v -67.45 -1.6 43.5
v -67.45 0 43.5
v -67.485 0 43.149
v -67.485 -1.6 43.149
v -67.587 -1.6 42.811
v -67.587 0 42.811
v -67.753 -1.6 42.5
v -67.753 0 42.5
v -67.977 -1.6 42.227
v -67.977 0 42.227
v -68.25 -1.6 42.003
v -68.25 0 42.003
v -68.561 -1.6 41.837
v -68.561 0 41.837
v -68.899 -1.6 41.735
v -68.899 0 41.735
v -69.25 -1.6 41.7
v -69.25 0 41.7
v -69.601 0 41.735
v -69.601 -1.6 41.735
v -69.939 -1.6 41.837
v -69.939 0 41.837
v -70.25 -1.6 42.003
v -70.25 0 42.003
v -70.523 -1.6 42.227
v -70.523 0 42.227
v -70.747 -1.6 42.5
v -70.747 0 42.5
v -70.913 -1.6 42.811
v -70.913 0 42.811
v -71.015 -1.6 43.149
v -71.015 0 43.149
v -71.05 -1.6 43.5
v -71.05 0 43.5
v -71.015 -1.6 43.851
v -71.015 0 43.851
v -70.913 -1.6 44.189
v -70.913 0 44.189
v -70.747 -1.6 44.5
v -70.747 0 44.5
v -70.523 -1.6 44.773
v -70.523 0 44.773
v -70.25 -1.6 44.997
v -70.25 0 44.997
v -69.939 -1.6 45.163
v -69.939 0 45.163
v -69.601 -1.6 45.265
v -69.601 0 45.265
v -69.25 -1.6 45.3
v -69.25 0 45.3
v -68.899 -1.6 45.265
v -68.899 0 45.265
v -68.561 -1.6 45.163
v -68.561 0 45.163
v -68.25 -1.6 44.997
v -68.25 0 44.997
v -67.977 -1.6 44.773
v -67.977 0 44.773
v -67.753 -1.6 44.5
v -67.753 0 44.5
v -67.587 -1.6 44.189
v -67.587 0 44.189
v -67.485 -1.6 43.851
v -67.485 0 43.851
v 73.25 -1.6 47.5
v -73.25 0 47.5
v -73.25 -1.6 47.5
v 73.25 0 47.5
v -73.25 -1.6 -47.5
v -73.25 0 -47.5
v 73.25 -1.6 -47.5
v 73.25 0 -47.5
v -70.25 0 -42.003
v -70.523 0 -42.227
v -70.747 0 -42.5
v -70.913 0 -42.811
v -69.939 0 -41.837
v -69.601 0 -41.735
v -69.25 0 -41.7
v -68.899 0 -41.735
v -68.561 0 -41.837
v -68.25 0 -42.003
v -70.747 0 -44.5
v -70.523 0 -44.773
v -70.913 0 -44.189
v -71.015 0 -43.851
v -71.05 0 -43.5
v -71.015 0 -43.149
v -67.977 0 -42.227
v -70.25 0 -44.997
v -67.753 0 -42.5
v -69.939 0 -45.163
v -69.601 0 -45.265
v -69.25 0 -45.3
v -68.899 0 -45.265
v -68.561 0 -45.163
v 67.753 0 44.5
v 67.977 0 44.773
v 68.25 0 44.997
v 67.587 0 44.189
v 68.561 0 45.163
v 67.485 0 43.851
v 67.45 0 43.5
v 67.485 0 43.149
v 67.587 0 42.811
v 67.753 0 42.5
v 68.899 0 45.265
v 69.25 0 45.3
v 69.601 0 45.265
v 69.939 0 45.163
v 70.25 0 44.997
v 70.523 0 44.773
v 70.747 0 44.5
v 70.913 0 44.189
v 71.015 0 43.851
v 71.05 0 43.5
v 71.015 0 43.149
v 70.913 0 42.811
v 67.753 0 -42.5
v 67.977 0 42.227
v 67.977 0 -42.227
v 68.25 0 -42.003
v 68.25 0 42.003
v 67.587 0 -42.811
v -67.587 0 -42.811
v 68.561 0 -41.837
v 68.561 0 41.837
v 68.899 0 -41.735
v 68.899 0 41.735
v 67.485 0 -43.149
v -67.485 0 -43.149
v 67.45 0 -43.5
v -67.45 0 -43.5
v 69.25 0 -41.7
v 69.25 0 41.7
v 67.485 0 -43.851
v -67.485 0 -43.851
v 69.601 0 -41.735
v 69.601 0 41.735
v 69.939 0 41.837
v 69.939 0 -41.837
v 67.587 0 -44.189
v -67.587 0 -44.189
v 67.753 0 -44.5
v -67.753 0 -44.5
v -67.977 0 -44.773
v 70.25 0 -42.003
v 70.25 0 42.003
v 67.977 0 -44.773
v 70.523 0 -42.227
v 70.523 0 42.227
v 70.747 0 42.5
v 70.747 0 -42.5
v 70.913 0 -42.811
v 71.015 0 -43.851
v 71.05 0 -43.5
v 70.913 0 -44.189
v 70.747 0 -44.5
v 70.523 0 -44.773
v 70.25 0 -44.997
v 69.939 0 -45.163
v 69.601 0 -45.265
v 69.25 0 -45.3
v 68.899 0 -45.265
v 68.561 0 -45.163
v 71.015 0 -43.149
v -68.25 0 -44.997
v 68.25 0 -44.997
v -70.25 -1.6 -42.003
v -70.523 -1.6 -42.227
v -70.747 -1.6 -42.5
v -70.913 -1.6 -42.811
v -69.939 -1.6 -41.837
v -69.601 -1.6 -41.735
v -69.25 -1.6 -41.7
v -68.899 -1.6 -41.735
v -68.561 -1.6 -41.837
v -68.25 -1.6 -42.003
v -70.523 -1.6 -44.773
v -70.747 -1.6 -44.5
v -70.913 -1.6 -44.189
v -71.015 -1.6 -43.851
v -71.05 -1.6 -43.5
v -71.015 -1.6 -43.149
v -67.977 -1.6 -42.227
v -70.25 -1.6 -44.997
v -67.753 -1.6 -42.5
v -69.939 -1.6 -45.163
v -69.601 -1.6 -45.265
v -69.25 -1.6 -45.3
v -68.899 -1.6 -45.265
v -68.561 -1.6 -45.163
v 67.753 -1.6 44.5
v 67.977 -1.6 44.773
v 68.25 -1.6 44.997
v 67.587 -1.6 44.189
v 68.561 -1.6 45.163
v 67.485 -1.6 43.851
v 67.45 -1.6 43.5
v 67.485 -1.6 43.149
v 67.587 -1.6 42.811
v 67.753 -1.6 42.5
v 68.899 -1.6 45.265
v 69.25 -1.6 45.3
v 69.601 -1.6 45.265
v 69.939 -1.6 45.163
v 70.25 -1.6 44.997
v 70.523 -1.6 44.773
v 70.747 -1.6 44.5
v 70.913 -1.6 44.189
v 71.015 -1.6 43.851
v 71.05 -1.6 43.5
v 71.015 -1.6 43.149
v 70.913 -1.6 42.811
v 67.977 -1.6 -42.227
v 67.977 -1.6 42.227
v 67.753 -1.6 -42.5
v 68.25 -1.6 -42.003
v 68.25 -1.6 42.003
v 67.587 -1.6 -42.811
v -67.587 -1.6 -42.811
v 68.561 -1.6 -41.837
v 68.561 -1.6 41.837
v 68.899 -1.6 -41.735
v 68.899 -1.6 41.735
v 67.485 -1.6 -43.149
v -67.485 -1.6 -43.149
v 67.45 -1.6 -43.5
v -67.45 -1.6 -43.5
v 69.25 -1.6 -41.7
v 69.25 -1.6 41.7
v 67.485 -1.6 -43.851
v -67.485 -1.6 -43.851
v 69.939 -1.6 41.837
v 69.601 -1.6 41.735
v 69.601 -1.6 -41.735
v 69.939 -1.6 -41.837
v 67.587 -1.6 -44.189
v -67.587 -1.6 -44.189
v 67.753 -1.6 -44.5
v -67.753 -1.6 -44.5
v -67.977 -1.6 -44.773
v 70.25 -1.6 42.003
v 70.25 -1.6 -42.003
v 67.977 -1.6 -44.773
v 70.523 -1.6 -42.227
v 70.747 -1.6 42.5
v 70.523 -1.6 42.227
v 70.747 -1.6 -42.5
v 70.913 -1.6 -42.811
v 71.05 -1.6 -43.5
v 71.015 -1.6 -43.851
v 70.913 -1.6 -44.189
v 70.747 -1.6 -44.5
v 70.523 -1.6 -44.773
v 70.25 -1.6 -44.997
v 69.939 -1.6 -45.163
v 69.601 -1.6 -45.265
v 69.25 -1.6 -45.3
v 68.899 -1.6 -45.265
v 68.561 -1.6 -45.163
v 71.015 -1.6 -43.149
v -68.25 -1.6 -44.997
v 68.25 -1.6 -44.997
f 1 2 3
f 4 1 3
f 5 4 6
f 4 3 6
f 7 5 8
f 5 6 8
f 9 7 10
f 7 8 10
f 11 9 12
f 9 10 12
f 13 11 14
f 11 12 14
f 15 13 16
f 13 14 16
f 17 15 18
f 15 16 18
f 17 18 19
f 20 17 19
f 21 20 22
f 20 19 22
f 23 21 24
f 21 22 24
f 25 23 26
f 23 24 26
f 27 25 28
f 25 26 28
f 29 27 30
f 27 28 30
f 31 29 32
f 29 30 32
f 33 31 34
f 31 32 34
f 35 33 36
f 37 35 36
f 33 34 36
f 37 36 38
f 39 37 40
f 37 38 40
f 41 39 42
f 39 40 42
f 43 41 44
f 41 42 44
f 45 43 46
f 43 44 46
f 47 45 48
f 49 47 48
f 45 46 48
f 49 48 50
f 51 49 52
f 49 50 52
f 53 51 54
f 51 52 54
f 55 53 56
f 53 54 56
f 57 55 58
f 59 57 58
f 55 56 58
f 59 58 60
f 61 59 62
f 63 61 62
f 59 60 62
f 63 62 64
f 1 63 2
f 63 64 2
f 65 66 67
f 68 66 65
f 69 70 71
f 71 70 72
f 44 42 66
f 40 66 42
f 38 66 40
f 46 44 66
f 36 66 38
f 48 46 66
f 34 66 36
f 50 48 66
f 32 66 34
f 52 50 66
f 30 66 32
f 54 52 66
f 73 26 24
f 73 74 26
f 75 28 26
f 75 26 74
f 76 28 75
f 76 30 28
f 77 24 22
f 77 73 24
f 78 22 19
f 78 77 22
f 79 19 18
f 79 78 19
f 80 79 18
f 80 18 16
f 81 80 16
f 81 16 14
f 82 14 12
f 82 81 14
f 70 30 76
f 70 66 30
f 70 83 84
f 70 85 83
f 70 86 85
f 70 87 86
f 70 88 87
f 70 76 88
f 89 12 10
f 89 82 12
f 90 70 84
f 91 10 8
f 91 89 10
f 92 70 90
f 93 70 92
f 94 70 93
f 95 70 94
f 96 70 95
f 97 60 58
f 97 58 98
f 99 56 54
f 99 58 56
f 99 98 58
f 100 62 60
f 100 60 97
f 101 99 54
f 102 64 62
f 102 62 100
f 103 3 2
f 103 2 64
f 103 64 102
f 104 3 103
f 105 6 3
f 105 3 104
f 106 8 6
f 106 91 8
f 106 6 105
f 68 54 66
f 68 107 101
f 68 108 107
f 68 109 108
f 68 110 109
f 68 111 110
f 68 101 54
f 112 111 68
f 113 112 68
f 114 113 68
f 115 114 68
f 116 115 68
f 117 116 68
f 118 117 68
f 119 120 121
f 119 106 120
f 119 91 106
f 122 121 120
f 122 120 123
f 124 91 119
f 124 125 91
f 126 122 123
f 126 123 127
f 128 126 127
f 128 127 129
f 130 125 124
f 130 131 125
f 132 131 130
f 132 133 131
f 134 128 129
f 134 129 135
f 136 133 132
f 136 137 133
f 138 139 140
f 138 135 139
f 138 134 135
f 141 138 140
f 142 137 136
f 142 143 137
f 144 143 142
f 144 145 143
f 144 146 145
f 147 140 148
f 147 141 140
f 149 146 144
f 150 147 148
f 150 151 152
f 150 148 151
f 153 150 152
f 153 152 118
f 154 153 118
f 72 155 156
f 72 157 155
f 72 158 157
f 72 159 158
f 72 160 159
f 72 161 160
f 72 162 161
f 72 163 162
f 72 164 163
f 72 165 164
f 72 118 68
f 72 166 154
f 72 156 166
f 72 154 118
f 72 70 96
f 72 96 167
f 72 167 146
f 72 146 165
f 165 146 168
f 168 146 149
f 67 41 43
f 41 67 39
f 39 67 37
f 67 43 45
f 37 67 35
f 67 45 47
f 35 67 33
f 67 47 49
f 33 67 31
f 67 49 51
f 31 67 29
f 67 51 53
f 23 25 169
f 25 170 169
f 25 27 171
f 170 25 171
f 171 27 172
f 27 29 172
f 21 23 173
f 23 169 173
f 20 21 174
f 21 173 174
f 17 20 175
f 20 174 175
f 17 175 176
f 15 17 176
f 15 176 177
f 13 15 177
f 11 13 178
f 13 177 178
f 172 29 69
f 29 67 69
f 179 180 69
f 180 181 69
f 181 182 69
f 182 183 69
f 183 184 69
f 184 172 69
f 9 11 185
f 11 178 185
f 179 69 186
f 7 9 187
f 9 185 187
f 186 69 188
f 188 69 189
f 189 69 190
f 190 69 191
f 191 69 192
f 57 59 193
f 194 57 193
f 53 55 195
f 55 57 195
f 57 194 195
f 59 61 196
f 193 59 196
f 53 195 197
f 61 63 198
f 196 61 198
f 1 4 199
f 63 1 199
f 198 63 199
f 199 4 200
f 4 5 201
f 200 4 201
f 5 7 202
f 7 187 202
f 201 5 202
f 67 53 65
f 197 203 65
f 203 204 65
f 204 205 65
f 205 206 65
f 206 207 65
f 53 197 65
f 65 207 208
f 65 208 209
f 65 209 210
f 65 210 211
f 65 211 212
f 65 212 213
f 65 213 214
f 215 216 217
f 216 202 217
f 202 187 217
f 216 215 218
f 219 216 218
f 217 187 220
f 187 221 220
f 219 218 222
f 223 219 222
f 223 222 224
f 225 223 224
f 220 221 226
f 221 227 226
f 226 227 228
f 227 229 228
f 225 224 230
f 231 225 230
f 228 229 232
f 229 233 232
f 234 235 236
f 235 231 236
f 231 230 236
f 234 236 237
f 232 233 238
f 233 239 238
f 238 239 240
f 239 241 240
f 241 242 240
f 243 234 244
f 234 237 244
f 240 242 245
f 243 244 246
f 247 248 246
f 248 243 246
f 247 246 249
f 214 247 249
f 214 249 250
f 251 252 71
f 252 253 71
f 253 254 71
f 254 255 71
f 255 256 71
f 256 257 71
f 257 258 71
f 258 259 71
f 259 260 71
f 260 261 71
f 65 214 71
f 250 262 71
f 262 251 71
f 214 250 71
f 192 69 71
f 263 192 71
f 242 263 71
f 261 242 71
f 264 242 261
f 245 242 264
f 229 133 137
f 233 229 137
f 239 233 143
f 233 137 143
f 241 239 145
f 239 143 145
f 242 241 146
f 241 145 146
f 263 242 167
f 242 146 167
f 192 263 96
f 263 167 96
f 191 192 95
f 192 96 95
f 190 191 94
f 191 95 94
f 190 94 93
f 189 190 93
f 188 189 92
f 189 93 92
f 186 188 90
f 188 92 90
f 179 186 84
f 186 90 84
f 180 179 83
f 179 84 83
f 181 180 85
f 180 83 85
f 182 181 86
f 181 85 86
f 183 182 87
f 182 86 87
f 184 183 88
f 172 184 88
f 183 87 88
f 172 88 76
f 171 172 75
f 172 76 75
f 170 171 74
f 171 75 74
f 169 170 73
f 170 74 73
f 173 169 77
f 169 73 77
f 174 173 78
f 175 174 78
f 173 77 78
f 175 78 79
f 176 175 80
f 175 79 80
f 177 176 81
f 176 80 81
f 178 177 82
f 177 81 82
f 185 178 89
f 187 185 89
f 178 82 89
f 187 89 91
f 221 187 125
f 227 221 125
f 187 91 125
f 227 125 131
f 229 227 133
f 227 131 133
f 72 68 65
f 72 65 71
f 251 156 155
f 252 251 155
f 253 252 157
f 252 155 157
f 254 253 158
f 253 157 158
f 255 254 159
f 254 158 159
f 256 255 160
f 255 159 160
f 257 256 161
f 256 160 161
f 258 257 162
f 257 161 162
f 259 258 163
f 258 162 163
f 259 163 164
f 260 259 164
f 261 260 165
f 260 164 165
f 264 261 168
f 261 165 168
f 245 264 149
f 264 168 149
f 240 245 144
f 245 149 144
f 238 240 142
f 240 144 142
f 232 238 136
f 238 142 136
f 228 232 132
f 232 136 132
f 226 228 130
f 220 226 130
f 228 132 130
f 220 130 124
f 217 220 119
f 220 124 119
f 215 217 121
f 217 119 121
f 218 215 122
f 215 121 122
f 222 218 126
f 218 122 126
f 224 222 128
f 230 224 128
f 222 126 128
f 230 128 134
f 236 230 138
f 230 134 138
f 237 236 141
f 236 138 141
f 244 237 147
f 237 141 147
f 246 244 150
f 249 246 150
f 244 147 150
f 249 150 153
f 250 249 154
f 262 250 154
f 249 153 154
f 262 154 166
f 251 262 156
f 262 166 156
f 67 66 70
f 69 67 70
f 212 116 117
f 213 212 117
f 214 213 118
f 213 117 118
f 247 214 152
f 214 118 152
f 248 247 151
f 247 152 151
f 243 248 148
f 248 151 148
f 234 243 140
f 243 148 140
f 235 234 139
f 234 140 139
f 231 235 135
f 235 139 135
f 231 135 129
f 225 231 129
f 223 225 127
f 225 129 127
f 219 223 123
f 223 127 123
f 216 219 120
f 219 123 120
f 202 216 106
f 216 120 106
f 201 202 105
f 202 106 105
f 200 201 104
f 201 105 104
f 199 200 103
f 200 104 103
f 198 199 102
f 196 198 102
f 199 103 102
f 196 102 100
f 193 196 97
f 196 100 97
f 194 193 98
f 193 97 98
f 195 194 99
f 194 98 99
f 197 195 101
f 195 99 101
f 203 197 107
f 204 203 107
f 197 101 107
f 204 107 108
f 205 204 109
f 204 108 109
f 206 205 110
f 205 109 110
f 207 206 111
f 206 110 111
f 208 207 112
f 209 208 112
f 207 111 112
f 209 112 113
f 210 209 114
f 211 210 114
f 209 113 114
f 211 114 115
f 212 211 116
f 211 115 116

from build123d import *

# Parameters (mm, degrees)
SKETCH2_W           = 146.5
SKETCH2_H           = 95
SKETCH2_R           = 1.8
BOSS_EXTRUDE1_DEPTH = 1.6


with BuildPart() as part:
    # Sketch2 → Boss-Extrude1 (new body)
    with BuildSketch(Plane(origin=(0, 0, 0), x_dir=(1, 0, 0), z_dir=(0, 1, 0))):
        Rectangle(SKETCH2_W, SKETCH2_H)
        with Locations((-69.25, 43.5)):
            Circle(SKETCH2_R, mode=Mode.SUBTRACT)
        with Locations((69.25, 43.5)):
            Circle(SKETCH2_R, mode=Mode.SUBTRACT)
        with Locations((69.25, -43.5)):
            Circle(SKETCH2_R, mode=Mode.SUBTRACT)
        with Locations((-69.25, -43.5)):
            Circle(SKETCH2_R, mode=Mode.SUBTRACT)
    extrude(amount=-BOSS_EXTRUDE1_DEPTH)


solid = part.part
